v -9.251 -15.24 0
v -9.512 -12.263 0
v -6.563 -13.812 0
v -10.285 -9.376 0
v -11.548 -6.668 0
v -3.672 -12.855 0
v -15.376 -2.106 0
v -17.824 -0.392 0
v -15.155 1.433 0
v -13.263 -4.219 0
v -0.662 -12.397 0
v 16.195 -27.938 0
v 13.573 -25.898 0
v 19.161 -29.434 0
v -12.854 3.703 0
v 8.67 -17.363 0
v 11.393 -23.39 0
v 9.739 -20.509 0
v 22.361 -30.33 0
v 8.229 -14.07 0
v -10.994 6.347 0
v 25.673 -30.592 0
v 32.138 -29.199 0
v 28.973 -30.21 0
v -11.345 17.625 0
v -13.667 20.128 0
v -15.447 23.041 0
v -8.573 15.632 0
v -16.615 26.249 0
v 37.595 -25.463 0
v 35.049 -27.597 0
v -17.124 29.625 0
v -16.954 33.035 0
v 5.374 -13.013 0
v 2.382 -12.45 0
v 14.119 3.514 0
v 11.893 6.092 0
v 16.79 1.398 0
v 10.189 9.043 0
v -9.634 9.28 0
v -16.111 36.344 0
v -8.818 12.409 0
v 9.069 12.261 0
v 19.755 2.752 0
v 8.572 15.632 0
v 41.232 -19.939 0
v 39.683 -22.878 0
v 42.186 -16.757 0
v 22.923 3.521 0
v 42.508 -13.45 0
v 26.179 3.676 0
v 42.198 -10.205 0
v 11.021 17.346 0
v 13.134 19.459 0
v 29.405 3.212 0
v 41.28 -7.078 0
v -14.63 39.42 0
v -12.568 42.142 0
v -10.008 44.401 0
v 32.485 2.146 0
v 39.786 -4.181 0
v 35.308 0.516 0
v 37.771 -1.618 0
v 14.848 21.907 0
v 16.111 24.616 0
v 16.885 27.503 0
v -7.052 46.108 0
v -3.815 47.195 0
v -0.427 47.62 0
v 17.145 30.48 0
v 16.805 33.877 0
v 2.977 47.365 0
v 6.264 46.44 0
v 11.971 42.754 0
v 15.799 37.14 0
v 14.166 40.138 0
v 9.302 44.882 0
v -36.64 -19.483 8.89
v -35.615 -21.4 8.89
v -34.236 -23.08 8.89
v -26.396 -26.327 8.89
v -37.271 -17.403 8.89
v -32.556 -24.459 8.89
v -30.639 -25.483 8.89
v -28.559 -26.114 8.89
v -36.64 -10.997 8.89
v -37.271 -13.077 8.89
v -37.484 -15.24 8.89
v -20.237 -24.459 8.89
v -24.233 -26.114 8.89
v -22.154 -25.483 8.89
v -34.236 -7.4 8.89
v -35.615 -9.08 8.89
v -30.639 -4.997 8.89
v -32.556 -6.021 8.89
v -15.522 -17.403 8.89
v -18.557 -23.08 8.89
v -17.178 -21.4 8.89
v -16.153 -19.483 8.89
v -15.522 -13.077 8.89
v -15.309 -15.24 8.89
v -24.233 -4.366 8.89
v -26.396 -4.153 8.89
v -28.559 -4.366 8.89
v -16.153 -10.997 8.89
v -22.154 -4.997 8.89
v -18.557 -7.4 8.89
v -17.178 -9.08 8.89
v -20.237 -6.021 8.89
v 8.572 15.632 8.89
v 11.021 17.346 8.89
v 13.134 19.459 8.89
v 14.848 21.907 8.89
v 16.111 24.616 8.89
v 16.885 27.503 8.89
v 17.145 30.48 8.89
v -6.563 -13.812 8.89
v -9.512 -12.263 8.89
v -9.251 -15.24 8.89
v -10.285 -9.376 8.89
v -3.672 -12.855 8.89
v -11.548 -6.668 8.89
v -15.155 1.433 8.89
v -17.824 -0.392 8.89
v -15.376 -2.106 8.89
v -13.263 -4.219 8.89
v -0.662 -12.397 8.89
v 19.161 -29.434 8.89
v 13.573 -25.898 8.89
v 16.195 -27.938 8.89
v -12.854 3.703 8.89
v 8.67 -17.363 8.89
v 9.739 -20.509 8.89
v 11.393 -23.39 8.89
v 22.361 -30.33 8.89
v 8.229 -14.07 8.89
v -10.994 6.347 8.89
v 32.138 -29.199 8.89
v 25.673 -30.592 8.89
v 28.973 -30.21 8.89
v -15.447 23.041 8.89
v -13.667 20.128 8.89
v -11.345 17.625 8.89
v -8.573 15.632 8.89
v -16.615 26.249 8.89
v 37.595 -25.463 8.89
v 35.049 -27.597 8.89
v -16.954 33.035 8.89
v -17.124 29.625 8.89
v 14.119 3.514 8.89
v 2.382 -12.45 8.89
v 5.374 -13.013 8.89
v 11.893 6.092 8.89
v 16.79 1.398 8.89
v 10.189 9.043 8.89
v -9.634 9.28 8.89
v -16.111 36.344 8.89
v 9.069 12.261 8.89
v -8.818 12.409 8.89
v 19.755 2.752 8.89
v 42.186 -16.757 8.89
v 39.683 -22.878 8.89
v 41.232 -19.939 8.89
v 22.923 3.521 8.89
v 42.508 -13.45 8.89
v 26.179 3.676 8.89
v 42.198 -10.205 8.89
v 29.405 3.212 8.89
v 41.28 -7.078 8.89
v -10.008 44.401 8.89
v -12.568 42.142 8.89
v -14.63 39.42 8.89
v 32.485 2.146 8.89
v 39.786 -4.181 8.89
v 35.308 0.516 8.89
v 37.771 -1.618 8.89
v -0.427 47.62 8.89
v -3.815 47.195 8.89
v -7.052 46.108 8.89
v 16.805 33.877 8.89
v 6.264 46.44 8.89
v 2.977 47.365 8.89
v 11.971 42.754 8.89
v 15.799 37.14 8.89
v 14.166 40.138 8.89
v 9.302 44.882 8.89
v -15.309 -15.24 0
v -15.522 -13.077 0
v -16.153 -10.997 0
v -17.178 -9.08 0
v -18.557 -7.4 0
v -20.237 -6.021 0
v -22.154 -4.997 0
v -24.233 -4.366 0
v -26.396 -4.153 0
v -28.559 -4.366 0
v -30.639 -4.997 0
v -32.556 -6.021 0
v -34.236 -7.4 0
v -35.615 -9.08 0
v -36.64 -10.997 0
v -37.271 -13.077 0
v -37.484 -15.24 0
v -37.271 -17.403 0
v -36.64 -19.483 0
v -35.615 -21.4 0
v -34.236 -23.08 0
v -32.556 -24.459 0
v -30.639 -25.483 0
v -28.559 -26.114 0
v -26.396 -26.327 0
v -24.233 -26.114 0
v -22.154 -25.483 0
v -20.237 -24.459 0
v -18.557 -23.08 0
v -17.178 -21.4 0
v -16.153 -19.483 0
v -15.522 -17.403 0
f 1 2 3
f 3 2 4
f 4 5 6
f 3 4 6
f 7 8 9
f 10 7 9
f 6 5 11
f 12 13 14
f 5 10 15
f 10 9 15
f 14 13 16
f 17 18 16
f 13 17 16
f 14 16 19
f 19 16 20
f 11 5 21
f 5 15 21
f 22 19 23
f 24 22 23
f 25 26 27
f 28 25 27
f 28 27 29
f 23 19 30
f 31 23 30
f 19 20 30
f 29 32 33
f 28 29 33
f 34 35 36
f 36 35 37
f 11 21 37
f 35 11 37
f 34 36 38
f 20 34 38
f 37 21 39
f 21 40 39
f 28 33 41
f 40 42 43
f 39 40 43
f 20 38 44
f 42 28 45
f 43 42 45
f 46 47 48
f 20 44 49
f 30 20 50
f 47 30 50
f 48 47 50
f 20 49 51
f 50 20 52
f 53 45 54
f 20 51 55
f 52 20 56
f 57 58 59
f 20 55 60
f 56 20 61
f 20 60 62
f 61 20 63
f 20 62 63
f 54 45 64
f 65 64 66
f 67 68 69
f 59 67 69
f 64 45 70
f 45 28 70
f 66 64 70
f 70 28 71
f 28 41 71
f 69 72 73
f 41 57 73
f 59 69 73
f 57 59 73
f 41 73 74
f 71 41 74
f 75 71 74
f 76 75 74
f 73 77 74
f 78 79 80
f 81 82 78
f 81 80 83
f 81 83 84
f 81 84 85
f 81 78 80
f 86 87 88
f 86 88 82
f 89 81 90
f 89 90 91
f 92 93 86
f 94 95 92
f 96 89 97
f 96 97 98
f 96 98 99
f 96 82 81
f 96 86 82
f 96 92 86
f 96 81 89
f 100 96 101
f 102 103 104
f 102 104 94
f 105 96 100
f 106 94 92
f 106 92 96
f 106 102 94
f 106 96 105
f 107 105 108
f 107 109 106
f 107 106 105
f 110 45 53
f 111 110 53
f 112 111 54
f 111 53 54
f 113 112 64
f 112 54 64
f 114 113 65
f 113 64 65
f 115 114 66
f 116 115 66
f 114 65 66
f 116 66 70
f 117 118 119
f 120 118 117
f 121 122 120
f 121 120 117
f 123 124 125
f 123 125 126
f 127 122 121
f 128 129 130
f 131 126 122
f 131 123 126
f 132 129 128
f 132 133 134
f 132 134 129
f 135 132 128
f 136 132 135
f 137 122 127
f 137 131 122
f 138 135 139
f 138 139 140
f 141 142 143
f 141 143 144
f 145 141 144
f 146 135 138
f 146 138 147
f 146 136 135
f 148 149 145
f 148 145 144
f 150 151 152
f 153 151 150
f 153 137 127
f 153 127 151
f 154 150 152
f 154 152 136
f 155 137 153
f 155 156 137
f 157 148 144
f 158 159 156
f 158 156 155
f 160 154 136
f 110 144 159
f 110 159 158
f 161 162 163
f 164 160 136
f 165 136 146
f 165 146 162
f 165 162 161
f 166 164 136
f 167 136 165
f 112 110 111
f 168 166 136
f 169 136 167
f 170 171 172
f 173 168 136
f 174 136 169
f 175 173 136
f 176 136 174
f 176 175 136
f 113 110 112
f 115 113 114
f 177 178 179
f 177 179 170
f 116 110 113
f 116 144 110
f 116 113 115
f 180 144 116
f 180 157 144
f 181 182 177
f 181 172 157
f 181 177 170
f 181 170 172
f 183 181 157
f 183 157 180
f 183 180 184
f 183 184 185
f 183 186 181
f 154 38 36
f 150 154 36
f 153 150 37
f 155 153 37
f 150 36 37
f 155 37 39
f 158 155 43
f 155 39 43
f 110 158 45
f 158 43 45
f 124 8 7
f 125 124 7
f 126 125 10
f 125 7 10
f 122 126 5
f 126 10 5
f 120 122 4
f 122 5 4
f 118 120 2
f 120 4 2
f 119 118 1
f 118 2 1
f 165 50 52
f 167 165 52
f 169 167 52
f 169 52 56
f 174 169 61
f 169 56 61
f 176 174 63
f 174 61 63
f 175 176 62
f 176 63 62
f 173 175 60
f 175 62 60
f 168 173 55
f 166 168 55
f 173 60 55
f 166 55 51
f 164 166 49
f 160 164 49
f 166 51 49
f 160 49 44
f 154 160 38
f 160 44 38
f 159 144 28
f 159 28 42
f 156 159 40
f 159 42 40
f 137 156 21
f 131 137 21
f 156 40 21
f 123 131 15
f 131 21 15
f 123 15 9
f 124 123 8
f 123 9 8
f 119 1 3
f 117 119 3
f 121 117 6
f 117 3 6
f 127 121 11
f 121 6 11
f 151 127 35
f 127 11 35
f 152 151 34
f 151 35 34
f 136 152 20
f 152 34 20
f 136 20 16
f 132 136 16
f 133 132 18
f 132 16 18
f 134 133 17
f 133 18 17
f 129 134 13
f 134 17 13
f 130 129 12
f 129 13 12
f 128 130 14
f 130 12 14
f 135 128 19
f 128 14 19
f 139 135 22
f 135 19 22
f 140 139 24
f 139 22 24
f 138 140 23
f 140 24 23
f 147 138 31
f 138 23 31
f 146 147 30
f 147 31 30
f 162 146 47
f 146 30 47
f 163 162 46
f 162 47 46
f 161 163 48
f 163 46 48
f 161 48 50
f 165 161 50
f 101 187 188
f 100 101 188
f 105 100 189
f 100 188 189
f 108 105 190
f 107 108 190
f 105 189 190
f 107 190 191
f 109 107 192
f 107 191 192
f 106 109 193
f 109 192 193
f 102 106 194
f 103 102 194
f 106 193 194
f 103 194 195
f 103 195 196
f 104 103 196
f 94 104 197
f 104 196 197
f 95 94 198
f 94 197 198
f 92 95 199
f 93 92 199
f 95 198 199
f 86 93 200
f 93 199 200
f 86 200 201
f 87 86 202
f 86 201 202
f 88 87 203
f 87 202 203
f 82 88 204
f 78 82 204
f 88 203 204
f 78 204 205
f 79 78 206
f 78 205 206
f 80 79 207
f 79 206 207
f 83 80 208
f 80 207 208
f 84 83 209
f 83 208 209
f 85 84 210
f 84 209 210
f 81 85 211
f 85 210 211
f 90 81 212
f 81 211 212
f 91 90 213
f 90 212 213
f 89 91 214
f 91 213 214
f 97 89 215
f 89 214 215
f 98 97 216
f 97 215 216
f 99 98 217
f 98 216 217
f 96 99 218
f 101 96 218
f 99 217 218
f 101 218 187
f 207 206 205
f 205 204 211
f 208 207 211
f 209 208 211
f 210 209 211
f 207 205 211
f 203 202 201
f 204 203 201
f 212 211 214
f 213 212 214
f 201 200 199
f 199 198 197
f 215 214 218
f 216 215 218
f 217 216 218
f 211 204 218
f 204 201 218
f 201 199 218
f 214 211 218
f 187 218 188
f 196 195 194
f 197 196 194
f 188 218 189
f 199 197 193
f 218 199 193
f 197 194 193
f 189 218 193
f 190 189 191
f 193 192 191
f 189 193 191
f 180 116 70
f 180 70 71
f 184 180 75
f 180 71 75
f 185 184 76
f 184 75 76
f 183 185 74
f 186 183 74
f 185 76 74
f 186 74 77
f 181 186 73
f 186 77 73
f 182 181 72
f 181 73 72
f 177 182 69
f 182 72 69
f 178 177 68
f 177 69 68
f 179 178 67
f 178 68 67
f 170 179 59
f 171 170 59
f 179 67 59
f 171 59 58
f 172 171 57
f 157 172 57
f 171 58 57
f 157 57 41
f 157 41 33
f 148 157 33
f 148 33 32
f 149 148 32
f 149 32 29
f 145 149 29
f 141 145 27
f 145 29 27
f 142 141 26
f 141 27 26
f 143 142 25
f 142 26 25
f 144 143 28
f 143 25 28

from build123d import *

# Parameters (mm, degrees)
F0_R     = 11.0871
F1_DEPTH = 8.89


# Not quite as in the source:
# - a feature names something its author has since deleted; it is built from what else it names


with BuildPart() as f1:
    # F0 (on Top) → F1 (new body)
    with BuildSketch(Plane.XY):
        with BuildLine():
            ThreePointArc((16.7904205794, 1.398138476), (10.362351598, -5.1472195886), (8.22912946, -14.0697274387))
            ThreePointArc((8.22912946, -14.0697274387), (25.672901431, -30.5920646228), (42.5079205794, -13.4498670719))
            ThreePointArc((42.5079205794, -13.4498670719), (33.9354205794, 1.398138476), (16.7904205794, 1.398138476))
        make_face()
        with Locations((25.3629205794, -13.4498670719)):
            Circle(F0_R, mode=Mode.SUBTRACT)
        with BuildLine():
            ThreePointArc((17.145, 30.48), (-8.5725, 45.3280055479), (-8.5725, 15.6319944521))
            ThreePointArc((-8.5725, 15.6319944521), (0, 13.335), (8.5725, 15.6319944521))
            ThreePointArc((8.5725, 15.6319944521), (14.8480055479, 21.9075), (17.145, 30.48))
        make_face()
        with Locations((0, 30.48)):
            Circle(F0_R, mode=Mode.SUBTRACT)
        with BuildLine():
            ThreePointArc((-17.8239543073, -0.3919944521), (-11.5484487595, -6.6675), (-9.2514543073, -15.24))
            ThreePointArc((-9.2514543073, -15.24), (-0.6623230767, -12.3969483031), (8.22912946, -14.0697274387))
            ThreePointArc((8.22912946, -14.0697274387), (10.362351598, -5.1472195886), (16.7904205794, 1.398138476))
            ThreePointArc((16.7904205794, 1.398138476), (10.971190185, 7.5276415587), (8.5725, 15.6319944521))
            ThreePointArc((8.5725, 15.6319944521), (0, 13.335), (-8.5725, 15.6319944521))
            ThreePointArc((-8.5725, 15.6319944521), (-10.9939497148, 6.3473598273), (-17.8239543073, -0.3919944521))
        make_face()
        Circle(F0_R, mode=Mode.SUBTRACT)
        Circle(F0_R)
        with Locations((0, 30.48)):
            Circle(F0_R)
        with Locations((25.3629205794, -13.4498670719)):
            Circle(F0_R)
    extrude(amount=F1_DEPTH)


with BuildPart() as f1b:
    # F0 (on Top) → F1, piece 2 (new body)
    with BuildSketch(Plane.XY):
        with Locations((-26.3964543073, -15.24)):
            Circle(F0_R)
    extrude(amount=F1_DEPTH)


solid = Compound([f1.part, f1b.part])
